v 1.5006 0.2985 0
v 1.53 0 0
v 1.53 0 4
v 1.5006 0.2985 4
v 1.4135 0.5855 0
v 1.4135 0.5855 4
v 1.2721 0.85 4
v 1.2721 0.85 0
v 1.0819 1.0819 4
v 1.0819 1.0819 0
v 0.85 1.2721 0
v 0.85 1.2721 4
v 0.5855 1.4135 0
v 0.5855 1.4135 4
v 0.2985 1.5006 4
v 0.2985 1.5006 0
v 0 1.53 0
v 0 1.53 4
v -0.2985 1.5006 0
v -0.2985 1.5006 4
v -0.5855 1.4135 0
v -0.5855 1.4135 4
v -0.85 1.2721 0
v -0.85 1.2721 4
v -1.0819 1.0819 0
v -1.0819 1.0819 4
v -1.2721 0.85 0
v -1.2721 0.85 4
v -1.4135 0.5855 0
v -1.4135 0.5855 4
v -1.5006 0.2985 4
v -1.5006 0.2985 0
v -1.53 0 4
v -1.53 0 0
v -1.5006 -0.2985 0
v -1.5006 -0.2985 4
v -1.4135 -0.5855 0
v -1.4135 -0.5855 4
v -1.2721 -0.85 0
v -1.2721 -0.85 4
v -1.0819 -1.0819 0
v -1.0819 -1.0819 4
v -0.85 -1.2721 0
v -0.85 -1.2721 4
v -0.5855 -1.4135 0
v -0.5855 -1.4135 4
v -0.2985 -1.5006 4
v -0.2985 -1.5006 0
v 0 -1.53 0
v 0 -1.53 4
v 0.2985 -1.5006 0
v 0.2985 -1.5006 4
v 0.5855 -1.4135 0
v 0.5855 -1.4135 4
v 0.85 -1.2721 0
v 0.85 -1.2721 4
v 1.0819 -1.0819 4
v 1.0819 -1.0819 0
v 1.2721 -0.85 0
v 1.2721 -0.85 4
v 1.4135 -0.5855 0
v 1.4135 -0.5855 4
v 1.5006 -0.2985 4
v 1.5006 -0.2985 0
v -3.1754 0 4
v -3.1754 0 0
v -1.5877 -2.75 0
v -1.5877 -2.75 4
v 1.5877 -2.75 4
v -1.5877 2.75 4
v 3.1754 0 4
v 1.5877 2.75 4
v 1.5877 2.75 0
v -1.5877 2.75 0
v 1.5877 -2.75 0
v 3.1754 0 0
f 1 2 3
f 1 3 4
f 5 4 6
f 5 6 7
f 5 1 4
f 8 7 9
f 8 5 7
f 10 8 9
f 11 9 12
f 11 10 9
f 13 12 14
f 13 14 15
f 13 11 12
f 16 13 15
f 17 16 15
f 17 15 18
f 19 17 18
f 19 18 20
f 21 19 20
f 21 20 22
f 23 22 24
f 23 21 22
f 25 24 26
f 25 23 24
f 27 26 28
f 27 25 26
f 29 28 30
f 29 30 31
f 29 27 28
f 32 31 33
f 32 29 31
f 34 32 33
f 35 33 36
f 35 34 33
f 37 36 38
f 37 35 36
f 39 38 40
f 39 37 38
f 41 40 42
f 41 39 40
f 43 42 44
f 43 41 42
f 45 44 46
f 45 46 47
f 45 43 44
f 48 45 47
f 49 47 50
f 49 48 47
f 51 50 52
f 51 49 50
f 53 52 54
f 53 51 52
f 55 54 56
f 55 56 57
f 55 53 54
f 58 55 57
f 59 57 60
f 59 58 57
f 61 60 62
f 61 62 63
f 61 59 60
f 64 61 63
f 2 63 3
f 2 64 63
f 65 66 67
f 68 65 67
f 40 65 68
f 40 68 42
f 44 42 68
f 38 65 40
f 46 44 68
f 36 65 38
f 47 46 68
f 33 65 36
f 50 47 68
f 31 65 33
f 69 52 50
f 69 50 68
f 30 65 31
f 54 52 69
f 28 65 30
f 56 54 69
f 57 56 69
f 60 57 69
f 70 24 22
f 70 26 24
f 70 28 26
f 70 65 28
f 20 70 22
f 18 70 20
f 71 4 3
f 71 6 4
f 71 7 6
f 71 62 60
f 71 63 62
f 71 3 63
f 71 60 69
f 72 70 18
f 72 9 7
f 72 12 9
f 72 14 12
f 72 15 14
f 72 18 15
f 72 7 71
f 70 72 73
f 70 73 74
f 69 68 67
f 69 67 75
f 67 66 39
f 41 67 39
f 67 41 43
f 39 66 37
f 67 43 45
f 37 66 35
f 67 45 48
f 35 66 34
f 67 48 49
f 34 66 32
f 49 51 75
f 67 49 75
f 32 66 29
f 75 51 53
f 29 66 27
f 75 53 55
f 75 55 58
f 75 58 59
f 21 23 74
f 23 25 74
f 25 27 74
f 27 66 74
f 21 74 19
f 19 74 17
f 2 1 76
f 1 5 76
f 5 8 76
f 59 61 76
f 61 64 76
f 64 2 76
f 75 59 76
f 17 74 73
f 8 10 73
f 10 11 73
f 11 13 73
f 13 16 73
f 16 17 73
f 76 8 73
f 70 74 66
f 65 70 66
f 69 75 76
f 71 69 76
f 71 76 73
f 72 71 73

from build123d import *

# Parameters (mm, degrees)
S01_HEXAGON_AND_NOMINAL_THREAD_ENVELOP_R       = 1.53
F_01_HEXAGON_AND_NOMINAL_THREAD_ENVELOPE_DEPTH = 4


with BuildPart() as part:
    # S01 - Hexagon and nominal thread envelope → 01 - Hexagon and nominal thread envelope (new body)
    with BuildSketch(Plane.XY):
        Polygon((3.175426481, 0), (1.58771324, 2.75), (-1.58771324, 2.75), (-3.175426481, 0), (-1.58771324, -2.75), (1.58771324, -2.75), align=None)
        Circle(S01_HEXAGON_AND_NOMINAL_THREAD_ENVELOP_R, mode=Mode.SUBTRACT)
    extrude(amount=F_01_HEXAGON_AND_NOMINAL_THREAD_ENVELOPE_DEPTH)


solid = part.part
